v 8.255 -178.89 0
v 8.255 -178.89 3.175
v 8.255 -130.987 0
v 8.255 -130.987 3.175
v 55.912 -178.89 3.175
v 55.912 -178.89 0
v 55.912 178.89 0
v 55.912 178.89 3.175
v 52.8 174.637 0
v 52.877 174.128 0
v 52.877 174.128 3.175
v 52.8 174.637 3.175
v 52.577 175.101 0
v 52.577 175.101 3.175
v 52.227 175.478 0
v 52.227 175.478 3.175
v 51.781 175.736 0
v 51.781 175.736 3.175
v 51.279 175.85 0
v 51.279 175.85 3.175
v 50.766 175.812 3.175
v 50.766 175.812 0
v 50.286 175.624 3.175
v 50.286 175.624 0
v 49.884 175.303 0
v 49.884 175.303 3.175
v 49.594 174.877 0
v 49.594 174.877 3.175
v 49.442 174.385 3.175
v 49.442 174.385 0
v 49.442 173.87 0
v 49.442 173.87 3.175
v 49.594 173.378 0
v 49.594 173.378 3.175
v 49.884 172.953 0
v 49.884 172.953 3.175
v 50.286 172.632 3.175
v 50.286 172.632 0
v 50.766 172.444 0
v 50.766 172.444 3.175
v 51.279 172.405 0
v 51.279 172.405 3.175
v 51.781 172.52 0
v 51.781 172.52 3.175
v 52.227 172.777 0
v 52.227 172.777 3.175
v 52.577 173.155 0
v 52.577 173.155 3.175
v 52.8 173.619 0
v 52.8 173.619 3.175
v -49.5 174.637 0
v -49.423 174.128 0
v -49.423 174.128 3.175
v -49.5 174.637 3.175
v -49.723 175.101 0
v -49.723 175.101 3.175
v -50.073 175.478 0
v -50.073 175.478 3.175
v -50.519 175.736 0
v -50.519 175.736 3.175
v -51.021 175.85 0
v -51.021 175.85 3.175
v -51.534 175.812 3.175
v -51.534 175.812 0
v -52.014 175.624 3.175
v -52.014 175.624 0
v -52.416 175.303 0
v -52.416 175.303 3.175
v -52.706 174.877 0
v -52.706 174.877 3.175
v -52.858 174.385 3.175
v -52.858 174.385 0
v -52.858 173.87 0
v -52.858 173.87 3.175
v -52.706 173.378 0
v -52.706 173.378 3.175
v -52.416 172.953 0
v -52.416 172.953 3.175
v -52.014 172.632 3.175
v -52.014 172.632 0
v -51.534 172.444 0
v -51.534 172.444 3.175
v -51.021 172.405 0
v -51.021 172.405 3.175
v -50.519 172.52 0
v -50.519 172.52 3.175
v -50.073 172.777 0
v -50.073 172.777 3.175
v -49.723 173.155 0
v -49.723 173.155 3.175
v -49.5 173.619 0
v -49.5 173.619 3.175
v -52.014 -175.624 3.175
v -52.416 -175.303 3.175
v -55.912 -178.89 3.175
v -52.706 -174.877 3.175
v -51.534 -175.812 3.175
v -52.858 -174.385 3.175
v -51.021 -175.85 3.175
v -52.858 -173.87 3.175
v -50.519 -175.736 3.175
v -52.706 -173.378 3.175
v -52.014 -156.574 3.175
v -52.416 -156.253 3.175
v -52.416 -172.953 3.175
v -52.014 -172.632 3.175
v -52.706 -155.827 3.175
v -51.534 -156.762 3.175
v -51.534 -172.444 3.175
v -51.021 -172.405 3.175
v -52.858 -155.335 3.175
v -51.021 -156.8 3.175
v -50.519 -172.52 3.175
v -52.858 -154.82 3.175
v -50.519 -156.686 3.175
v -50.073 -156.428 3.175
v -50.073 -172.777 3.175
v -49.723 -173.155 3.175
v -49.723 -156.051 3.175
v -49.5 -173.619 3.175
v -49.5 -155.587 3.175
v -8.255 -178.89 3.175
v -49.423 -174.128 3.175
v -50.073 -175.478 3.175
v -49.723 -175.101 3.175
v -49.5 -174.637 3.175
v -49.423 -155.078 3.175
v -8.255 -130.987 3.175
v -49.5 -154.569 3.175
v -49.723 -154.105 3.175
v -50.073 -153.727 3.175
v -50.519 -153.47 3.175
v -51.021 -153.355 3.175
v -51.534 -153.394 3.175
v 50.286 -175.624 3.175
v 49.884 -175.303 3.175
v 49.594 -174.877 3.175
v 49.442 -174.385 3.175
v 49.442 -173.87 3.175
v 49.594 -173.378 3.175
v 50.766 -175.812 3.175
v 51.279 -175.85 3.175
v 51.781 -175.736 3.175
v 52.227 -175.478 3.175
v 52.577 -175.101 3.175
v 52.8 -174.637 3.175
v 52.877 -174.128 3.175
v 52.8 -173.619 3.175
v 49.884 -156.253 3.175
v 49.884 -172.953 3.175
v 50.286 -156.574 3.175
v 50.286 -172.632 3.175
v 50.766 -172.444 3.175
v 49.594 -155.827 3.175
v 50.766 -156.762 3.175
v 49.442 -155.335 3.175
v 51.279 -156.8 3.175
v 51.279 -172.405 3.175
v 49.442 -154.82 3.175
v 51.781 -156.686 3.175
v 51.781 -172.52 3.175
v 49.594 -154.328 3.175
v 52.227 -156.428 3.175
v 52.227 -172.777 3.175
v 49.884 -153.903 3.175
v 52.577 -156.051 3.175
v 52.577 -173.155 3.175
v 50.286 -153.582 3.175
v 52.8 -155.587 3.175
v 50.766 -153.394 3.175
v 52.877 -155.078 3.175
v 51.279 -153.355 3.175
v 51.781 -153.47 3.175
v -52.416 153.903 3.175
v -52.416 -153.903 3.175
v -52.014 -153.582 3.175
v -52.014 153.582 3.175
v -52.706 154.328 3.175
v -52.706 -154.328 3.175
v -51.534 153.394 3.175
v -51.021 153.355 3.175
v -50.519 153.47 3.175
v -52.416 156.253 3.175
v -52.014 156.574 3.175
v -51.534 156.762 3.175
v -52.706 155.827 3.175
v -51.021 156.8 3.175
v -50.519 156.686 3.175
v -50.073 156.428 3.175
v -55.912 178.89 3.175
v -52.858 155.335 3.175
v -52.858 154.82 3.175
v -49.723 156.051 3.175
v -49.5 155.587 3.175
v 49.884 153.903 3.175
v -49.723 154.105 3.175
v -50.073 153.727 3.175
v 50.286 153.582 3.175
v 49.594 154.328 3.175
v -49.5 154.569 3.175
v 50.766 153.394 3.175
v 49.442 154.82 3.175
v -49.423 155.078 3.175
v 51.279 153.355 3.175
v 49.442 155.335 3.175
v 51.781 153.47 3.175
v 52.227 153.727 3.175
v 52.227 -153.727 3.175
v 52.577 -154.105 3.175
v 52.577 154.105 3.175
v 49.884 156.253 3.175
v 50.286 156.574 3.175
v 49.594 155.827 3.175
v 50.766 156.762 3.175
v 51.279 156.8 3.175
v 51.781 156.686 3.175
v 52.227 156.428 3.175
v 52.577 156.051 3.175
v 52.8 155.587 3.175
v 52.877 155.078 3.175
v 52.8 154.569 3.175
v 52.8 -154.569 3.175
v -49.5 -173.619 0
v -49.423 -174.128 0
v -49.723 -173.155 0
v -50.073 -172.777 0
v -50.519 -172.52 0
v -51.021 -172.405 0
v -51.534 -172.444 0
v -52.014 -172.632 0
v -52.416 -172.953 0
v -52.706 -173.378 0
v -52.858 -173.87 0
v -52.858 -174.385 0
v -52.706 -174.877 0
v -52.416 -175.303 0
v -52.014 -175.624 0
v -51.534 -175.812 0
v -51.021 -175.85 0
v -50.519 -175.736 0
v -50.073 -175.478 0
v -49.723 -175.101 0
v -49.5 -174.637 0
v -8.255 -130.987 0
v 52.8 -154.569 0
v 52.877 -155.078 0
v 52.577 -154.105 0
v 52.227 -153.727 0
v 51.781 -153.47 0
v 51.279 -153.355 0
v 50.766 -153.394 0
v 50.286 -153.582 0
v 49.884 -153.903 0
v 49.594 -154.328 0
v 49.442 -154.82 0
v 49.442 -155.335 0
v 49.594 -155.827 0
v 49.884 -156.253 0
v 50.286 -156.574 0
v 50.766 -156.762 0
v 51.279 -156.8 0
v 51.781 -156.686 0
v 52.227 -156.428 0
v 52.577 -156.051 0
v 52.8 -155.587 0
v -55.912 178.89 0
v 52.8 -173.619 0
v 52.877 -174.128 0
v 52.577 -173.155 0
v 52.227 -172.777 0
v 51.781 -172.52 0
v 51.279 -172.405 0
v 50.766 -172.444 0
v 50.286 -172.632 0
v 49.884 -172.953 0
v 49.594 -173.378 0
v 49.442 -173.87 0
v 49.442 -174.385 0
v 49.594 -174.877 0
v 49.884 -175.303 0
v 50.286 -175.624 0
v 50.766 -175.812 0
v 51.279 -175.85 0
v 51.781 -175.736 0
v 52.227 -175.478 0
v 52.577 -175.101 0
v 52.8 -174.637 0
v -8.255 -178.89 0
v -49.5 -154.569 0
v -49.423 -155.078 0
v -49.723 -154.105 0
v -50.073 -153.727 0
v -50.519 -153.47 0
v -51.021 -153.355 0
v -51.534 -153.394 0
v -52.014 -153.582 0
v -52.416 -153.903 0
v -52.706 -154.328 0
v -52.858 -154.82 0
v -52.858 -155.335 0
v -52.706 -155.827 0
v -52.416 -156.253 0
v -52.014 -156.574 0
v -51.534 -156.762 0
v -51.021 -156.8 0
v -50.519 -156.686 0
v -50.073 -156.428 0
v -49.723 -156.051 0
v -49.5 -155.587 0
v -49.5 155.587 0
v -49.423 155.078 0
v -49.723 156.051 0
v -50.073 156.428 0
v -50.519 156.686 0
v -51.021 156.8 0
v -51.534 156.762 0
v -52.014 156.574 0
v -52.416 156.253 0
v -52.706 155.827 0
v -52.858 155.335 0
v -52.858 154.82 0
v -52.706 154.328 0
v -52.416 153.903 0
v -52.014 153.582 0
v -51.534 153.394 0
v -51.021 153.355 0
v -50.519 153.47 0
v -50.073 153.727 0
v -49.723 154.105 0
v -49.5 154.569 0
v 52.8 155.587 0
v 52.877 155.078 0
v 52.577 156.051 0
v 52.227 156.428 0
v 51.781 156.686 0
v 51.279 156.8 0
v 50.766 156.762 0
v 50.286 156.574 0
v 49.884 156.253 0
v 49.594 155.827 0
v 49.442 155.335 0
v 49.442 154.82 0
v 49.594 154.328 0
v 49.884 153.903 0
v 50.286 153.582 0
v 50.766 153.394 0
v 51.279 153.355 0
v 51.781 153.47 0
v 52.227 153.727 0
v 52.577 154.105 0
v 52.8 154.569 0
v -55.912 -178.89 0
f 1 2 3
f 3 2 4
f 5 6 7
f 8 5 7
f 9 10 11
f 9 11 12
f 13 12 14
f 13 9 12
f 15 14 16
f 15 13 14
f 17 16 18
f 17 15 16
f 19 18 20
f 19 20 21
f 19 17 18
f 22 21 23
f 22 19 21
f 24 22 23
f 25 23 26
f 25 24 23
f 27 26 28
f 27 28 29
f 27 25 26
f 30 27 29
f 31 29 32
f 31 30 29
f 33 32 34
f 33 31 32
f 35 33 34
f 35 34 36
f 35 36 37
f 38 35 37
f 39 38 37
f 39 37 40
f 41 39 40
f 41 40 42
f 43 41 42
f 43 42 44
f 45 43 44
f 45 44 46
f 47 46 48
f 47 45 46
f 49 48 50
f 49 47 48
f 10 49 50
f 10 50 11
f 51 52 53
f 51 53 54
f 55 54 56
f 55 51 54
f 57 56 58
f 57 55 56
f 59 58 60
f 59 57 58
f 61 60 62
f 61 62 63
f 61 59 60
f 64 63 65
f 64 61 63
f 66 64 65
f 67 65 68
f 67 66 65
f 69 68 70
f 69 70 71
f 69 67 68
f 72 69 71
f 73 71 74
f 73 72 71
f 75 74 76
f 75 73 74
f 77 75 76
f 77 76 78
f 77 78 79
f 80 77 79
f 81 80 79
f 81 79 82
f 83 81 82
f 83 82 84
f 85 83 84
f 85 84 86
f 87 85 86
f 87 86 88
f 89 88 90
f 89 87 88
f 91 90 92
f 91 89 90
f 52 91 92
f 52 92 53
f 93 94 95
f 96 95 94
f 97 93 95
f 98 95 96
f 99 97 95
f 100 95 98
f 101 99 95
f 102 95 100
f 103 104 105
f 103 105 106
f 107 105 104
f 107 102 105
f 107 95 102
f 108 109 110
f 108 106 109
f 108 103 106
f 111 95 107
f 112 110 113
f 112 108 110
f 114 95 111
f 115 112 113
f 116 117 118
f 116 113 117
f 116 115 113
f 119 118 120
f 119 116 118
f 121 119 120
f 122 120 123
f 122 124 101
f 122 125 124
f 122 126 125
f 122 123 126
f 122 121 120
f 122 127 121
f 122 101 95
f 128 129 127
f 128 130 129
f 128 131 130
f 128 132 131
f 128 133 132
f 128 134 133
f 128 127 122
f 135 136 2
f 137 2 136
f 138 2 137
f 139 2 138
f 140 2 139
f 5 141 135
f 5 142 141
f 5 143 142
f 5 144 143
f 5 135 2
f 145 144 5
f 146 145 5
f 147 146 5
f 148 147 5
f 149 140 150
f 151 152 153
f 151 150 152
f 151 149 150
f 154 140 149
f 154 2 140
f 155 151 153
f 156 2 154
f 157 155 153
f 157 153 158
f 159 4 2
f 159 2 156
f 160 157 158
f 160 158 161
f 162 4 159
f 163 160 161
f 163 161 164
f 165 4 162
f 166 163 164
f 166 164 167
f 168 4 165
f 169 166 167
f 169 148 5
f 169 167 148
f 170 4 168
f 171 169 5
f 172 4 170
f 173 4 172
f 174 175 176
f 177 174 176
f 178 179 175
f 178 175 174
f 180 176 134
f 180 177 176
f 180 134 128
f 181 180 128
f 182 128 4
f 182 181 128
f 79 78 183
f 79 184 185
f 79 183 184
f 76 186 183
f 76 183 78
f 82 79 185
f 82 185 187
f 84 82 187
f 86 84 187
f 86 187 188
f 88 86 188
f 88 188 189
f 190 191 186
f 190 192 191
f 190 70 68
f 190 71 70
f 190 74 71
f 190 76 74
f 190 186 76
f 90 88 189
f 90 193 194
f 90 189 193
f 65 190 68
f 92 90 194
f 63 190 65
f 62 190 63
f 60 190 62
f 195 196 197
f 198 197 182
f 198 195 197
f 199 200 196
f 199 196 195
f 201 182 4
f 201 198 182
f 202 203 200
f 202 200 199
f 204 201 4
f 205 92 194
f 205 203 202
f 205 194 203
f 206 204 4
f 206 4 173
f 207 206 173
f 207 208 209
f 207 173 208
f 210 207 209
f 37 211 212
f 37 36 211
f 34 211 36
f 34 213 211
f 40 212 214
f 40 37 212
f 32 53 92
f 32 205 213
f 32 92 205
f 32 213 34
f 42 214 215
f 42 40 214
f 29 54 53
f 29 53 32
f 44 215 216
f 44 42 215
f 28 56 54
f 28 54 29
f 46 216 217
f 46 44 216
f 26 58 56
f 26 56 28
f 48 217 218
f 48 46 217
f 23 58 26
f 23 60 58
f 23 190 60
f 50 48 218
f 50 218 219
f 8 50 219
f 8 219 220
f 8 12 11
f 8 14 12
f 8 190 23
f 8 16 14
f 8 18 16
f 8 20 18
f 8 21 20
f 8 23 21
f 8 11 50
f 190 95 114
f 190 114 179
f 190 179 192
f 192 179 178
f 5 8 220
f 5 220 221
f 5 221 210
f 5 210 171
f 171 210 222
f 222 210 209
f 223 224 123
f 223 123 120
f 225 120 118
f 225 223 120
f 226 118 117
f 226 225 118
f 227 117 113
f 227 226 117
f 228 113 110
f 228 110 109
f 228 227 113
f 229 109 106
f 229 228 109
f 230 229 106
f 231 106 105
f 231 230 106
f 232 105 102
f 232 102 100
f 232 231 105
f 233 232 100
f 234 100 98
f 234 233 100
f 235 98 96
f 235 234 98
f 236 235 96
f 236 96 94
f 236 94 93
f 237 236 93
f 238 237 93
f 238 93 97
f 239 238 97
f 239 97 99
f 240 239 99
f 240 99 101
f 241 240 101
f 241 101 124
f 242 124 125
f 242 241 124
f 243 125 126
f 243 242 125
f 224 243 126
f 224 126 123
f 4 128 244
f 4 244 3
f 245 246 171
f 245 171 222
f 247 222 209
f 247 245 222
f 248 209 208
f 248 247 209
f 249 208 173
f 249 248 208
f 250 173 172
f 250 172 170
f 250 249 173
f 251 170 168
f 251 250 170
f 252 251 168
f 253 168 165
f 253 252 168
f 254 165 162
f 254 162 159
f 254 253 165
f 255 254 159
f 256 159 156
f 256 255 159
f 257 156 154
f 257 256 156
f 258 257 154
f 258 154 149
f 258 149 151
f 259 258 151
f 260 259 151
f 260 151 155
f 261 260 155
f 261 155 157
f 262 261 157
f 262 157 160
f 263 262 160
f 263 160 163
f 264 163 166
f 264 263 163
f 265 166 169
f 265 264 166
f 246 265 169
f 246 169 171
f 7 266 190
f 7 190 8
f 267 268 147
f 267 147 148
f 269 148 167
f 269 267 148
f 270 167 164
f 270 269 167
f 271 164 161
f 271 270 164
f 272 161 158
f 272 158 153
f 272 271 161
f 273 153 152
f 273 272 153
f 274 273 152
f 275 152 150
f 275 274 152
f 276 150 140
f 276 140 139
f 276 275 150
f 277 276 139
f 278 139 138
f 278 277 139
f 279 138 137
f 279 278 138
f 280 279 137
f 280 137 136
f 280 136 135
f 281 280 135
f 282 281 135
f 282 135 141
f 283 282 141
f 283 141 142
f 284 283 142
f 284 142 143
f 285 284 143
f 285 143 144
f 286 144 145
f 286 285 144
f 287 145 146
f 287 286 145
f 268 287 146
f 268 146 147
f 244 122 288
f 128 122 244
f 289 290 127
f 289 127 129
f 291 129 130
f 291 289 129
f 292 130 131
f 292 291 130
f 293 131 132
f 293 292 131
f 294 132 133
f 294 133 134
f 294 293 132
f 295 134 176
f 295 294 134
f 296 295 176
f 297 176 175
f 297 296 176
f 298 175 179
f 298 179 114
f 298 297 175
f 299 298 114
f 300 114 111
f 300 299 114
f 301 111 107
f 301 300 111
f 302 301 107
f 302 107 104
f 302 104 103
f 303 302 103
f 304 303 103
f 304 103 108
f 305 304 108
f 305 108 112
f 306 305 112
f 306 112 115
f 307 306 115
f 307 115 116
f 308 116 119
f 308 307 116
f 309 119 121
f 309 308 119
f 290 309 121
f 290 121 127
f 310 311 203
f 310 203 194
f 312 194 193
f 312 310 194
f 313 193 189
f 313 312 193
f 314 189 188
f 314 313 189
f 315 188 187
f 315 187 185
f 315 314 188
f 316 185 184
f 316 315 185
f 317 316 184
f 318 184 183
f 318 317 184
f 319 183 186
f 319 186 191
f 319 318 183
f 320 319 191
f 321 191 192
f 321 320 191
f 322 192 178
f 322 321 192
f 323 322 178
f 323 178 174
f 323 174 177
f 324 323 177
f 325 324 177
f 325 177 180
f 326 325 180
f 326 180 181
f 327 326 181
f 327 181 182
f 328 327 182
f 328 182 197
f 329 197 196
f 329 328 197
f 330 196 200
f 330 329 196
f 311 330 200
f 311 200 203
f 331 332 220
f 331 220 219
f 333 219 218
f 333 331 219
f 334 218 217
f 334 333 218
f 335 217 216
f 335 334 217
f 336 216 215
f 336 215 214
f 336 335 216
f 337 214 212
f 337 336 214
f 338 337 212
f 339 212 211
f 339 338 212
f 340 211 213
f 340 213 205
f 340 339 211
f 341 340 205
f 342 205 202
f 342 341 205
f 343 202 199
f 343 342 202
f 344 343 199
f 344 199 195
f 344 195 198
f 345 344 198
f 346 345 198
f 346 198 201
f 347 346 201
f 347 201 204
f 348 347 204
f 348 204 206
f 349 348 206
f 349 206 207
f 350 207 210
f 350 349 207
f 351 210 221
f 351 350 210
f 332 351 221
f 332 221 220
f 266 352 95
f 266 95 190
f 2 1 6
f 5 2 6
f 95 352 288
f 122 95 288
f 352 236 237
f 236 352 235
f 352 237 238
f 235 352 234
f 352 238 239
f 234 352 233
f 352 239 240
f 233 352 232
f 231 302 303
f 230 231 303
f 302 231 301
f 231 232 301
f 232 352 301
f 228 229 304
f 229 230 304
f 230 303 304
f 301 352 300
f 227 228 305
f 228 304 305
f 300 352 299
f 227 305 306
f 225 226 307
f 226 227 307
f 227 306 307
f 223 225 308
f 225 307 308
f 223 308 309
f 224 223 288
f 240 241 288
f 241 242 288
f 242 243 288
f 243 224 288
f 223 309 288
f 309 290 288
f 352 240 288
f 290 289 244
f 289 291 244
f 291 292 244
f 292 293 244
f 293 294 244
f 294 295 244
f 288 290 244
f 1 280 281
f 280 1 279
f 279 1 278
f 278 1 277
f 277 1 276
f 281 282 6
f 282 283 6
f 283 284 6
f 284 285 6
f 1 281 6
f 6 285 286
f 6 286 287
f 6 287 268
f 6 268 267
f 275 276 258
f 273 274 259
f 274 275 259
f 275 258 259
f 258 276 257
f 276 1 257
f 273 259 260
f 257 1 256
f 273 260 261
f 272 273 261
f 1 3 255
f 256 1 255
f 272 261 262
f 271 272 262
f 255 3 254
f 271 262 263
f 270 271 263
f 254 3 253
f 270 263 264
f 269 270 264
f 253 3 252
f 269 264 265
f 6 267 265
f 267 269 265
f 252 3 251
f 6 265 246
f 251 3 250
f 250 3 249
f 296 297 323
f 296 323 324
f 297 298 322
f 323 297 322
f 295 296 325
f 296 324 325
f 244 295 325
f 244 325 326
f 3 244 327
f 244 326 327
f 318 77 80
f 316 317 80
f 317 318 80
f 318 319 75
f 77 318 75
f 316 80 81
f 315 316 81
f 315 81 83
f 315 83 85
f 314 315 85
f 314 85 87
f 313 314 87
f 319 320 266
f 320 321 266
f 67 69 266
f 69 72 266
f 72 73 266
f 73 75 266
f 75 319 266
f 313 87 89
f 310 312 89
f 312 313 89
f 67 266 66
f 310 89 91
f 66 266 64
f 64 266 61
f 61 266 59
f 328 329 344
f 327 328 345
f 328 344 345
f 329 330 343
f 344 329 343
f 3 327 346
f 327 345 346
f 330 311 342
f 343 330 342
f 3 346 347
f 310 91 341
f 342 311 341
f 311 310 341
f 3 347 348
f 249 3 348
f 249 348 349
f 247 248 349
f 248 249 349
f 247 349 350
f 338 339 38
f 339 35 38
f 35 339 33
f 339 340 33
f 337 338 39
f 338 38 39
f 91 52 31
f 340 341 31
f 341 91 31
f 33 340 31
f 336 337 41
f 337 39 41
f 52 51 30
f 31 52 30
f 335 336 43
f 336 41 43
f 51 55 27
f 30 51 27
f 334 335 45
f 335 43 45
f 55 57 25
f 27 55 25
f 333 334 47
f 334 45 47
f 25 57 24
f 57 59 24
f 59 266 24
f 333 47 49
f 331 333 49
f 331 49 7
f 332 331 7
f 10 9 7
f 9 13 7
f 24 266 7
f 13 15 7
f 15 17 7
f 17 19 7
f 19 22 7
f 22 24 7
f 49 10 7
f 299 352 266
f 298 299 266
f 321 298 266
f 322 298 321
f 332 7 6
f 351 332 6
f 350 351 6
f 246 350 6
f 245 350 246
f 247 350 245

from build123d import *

# Parameters (mm, degrees)
F0_W     = 111.8249478
F0_H     = 357.780717
F0_R     = 1.7272
F1_DEPTH = 3.175
F2_W     = 16.51
F2_H     = 47.9032060428
F3_DEPTH = 3.175


with BuildPart() as f1:
    # F0 (on Top) → F1 (new body)
    with BuildSketch(Plane.XY):
        Rectangle(F0_W, F0_H)
        with Locations((-51.1499739, -174.1278585)):
            Circle(F0_R, mode=Mode.SUBTRACT)
        with Locations((-51.1499739, -155.0778585)):
            Circle(F0_R, mode=Mode.SUBTRACT)
        with Locations((51.1499739, -174.1278585)):
            Circle(F0_R, mode=Mode.SUBTRACT)
        with Locations((51.1499739, -155.0778585)):
            Circle(F0_R, mode=Mode.SUBTRACT)
        with Locations((-51.1499739, 155.0778585)):
            Circle(F0_R, mode=Mode.SUBTRACT)
        with Locations((-51.1499739, 174.1278585)):
            Circle(F0_R, mode=Mode.SUBTRACT)
        with Locations((51.1499739, 155.0778585)):
            Circle(F0_R, mode=Mode.SUBTRACT)
        with Locations((51.1499739, 174.1278585)):
            Circle(F0_R, mode=Mode.SUBTRACT)
    extrude(amount=F1_DEPTH)

    # F2 (on face) → F3 (cut, through all)
    with BuildSketch(Plane.XY.offset(3.175)):
        with Locations((0, -154.9387554786)):
            Rectangle(F2_W, F2_H)
    extrude(amount=-F3_DEPTH, mode=Mode.SUBTRACT)


solid = f1.part
